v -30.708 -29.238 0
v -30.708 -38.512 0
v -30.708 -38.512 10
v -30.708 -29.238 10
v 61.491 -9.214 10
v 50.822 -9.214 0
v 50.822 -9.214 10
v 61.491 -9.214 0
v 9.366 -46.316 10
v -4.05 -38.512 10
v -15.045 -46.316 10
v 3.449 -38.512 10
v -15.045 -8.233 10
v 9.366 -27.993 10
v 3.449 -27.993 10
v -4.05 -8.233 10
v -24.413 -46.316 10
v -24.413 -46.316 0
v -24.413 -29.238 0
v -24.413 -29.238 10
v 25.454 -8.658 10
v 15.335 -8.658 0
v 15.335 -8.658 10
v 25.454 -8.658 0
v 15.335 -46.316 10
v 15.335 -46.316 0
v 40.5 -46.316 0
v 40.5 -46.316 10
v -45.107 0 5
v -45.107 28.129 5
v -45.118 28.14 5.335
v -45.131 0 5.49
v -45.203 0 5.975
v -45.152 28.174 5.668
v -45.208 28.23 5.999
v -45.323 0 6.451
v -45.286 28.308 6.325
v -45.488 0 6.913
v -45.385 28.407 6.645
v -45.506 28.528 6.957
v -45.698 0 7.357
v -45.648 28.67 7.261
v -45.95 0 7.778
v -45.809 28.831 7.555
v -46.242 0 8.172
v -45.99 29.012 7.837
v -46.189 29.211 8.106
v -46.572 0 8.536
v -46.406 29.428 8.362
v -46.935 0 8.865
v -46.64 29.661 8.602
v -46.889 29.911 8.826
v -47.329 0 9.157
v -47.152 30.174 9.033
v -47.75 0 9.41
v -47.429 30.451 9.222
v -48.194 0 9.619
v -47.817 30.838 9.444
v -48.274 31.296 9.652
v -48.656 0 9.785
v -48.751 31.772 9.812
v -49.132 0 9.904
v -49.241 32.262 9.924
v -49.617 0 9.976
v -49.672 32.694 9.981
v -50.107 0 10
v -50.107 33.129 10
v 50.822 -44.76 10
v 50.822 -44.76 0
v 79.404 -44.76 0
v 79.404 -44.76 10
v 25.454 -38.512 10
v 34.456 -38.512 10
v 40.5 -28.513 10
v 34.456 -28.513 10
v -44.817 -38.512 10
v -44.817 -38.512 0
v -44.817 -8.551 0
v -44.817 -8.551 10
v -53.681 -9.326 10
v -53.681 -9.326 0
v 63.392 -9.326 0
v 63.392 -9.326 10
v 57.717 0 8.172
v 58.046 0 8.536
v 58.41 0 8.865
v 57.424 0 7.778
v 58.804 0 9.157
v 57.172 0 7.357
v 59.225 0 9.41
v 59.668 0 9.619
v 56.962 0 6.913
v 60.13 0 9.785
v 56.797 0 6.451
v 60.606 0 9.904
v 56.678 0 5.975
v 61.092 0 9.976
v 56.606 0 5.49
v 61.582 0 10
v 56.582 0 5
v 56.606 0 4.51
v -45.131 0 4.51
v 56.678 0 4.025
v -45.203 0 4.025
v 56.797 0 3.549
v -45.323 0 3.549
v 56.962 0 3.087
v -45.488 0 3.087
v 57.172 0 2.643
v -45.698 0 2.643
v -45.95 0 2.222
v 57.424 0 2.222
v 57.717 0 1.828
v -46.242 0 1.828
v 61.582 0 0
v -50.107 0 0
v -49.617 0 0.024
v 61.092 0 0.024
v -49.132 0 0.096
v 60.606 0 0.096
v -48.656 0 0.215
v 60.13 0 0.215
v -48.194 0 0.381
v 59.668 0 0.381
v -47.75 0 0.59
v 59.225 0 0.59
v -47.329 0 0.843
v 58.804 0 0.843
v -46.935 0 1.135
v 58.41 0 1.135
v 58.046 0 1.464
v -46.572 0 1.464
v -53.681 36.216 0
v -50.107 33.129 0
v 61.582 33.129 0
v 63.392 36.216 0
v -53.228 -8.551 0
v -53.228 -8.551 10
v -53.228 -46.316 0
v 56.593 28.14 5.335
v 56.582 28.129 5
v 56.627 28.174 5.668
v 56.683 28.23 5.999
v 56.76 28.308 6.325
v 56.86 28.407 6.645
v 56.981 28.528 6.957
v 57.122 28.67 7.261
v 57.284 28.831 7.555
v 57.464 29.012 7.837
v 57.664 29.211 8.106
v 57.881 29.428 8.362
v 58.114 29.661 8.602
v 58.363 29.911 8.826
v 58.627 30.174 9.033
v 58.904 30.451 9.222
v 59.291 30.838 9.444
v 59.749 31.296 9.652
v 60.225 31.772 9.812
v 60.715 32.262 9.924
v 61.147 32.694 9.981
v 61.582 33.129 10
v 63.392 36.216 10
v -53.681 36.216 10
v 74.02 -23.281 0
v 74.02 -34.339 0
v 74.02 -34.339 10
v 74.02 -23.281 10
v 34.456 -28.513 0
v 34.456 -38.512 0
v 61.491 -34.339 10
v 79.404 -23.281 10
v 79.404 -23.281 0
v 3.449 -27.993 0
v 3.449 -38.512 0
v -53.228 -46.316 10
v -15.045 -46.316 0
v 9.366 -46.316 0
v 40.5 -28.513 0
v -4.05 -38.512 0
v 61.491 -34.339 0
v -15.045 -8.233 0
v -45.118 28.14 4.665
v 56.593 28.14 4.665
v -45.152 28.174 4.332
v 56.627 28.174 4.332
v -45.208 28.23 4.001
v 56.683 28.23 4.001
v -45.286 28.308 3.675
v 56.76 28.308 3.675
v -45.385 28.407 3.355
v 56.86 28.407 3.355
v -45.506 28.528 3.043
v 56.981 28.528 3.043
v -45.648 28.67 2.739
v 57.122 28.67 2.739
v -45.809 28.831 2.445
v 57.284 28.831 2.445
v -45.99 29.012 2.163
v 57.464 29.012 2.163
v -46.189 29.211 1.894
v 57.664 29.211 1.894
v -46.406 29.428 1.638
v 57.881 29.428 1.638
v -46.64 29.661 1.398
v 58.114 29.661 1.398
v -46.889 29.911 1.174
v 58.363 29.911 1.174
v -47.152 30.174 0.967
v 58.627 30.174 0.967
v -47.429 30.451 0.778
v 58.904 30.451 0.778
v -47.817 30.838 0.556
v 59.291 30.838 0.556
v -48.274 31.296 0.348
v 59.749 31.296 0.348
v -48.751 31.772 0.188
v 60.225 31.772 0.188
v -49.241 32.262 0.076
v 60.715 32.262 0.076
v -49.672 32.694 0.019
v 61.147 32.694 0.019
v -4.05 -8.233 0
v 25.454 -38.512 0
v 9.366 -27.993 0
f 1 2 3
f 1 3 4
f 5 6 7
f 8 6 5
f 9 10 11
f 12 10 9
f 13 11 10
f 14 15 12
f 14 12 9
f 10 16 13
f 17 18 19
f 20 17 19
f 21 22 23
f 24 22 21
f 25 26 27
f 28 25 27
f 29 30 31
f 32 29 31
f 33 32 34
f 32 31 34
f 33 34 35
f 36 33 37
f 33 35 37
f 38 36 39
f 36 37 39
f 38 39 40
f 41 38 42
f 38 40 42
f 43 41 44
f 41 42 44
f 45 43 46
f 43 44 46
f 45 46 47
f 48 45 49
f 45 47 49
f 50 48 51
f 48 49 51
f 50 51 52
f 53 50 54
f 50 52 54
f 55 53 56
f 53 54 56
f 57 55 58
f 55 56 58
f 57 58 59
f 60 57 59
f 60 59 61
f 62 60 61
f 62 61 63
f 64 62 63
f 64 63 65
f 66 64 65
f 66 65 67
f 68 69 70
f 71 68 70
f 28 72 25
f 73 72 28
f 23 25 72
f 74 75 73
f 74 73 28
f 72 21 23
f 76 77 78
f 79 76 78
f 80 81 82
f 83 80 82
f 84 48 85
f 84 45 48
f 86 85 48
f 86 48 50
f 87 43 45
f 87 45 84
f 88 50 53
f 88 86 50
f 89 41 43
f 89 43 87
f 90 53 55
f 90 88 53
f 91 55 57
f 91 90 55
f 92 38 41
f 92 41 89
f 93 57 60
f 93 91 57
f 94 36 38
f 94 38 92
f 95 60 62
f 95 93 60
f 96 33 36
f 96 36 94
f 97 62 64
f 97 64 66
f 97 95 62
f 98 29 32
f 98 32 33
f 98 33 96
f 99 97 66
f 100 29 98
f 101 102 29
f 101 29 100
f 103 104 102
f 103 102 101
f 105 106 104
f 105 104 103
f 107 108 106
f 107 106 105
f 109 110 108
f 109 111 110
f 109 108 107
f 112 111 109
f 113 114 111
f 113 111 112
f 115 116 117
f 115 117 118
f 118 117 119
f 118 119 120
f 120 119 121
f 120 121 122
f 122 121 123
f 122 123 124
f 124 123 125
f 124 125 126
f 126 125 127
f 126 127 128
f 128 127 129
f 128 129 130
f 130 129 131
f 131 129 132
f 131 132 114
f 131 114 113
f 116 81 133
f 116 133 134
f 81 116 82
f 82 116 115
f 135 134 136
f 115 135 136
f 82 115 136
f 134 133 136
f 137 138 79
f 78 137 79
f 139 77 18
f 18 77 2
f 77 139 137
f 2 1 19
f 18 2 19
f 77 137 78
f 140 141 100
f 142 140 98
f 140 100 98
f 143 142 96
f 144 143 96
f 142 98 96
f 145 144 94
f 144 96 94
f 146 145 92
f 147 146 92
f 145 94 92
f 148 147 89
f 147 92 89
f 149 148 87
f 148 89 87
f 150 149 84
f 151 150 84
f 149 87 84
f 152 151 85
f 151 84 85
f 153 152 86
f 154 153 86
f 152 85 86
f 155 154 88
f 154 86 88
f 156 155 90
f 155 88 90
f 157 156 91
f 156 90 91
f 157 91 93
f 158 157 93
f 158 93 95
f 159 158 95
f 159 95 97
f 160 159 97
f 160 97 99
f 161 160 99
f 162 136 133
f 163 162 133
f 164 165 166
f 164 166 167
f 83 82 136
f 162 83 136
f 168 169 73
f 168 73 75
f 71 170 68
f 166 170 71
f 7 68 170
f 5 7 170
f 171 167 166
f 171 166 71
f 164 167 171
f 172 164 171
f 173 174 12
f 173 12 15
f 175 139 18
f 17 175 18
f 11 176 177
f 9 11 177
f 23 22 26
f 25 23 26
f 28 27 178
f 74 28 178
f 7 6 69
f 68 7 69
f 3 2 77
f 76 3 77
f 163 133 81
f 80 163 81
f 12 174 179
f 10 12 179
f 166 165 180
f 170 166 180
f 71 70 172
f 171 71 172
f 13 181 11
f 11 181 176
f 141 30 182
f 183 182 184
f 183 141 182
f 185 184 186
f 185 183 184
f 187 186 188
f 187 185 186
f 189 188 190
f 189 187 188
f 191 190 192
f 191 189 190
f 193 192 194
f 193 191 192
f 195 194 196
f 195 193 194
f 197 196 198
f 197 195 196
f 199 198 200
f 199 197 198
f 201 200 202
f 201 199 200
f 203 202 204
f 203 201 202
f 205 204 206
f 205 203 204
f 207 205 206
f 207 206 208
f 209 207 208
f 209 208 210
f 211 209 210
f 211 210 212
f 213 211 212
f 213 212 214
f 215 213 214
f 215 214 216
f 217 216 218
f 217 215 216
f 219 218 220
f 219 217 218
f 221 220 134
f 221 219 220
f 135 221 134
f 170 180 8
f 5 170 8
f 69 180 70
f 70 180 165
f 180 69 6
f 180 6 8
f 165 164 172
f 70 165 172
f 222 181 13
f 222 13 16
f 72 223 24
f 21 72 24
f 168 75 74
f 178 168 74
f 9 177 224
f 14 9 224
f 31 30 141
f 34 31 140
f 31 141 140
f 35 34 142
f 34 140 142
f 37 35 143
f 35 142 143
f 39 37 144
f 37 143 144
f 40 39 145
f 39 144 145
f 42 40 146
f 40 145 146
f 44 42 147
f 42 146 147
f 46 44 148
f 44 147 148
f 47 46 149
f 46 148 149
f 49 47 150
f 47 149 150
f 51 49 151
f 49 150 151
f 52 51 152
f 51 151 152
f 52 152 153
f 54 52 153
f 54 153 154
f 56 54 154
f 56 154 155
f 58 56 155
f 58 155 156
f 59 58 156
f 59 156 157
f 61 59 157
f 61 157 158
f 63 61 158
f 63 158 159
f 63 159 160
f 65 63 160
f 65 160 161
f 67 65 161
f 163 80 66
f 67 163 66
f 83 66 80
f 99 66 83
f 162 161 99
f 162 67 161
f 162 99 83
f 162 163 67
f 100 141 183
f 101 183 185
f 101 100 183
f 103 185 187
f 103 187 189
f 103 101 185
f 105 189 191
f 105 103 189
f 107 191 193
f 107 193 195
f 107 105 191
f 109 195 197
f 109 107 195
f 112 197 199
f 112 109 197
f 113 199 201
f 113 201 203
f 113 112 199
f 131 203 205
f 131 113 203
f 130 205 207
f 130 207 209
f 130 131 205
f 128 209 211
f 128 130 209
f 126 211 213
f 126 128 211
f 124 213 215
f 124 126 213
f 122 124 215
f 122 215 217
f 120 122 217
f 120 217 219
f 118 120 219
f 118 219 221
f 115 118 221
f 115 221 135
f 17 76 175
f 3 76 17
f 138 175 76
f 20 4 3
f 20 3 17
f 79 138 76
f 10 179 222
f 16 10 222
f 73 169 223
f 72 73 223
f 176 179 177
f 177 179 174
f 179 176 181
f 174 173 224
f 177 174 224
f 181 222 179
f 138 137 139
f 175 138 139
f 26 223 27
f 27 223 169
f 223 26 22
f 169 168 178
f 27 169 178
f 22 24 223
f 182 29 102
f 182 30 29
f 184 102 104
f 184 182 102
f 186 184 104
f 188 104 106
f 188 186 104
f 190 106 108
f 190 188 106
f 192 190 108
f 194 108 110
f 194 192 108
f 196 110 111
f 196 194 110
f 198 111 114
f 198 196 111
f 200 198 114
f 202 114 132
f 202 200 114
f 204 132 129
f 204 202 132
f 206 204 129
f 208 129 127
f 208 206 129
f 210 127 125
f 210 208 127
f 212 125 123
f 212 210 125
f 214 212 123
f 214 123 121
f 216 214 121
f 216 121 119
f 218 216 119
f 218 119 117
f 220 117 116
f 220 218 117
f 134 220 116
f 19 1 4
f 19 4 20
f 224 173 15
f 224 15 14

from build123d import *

# Parameters (mm, degrees)
F0_W     = 7.9836137593
F0_H     = 8.0866143107
F0_W_2   = 101.6889624298
F0_W_3   = 6.8107172847
F0_H_2   = 28.1290598214
F0_H_3   = 9.3261292204
F0_W_4   = 8.5740201175
F2_DEPTH = 10
F1_W     = 8.4114409983
F1_H     = 7.8040771186
F1_H_2   = 29.9616772681
F1_W_2   = 14.1092445701
F1_W_3   = 6.2941126525
F1_H_3   = 9.2739127576
F1_W_4   = 10.995705612
F1_H_4   = 30.2792191505
F1_W_5   = 7.4987595435
F1_W_6   = 5.9168946464
F1_H_5   = 10.5194970965
F1_W_7   = 10.1195769385
F1_H_6   = 29.8540769145
F1_W_8   = 9.0015586466
F1_W_9   = 6.0446597636
F1_H_7   = 9.9997352809
F1_W_10  = 10.6686763465
F1_H_8   = 25.1244679093
F1_H_9   = 10.4209892452
F1_W_11  = 12.5288702548
F1_W_12  = 5.3845271468
F1_H_10  = 11.0574066639
F3_R     = 4.99999


# Not quite as in the source:
# - a fillet or chamfer is up to 0.001 mm smaller than in the source, because OpenCascade refuses the exact size


with BuildPart() as f2:
    # F0 (on Top) → F2 (new body)
    with BuildSketch(Plane.XY):
        Polygon((-53.0908405781, 28.1290598214), (-53.0908405781, 36.2156741321), (-53.6812469363, 36.2156741321), (-53.6812469363, 0), (-45.1072268188, 0), (-45.1072268188, 28.1290598214), align=None)
        with Locations((-49.0990336984, 32.1723669767)):
            Rectangle(F0_W, F0_H)
        with Locations((5.7372543961, 32.1723669767)):
            Rectangle(F0_W_2, F0_H)
        with Locations((59.9870942533, 32.1723669767)):
            Rectangle(F0_W_3, F0_H)
        with Locations((59.9870942533, 14.0645299107)):
            Rectangle(F0_W_3, F0_H_2)
        with Locations((59.9870942533, -4.6630646102)):
            Rectangle(F0_W_3, F0_H_3)
        with Locations((-49.3942368776, -4.6630646102)):
            Rectangle(F0_W_4, F0_H_3)
        with Locations((5.7372543961, -4.6630646102)):
            Rectangle(F0_W_2, F0_H_3)
    extrude(amount=F2_DEPTH)

    # F3 (radius 5 in the source; OpenCascade refuses exactly that, so slightly less here)
    f3_edges = [f2.edges().sort_by_distance(p)[0] for p in [
        (-45.107227, 14.06453, 0),
        (5.737254, 28.12906, 0),
        (56.581736, 14.06453, 10),
        (5.737254, 28.12906, 10),
        (-45.107227, 14.06453, 10),
        (56.581736, 14.06453, 0),
    ]]
    fillet(f3_edges, radius=F3_R)


with BuildPart() as f2b:
    # F1 (on Top) → F2, piece 2 (new body)
    with BuildSketch(Plane.XY):
        with Locations((-49.022493884, -42.4144025892)):
            Rectangle(F1_W, F1_H)
        with Locations((-49.022493884, -23.5315253958)):
            Rectangle(F1_W, F1_H_2)
        with Locations((-37.7621510997, -42.4144025892)):
            Rectangle(F1_W_2, F1_H)
        with Locations((-27.5604724884, -42.4144025892)):
            Rectangle(F1_W_3, F1_H)
        with Locations((-27.5604724884, -33.8754076511)):
            Rectangle(F1_W_3, F1_H_3)
    extrude(amount=F2_DEPTH)


with BuildPart() as f2c:
    # F1 (on Top) → F2, piece 3 (new body)
    with BuildSketch(Plane.XY):
        with Locations((-9.5474417321, -42.4144025892)):
            Rectangle(F1_W_4, F1_H)
        with Locations((-9.5474417321, -23.3727544546)):
            Rectangle(F1_W_4, F1_H_4)
        with Locations((-0.3002091544, -42.4144025892)):
            Rectangle(F1_W_5, F1_H)
        with Locations((6.4076179406, -42.4144025892)):
            Rectangle(F1_W_6, F1_H)
        with Locations((6.4076179406, -33.2526154816)):
            Rectangle(F1_W_6, F1_H_5)
    extrude(amount=F2_DEPTH)


with BuildPart() as f2d:
    # F1 (on Top) → F2, piece 4 (new body)
    with BuildSketch(Plane.XY):
        with Locations((20.3944290988, -42.4144025892)):
            Rectangle(F1_W_7, F1_H)
        with Locations((20.3944290988, -23.5853255726)):
            Rectangle(F1_W_7, F1_H_6)
        with Locations((29.9549968913, -42.4144025892)):
            Rectangle(F1_W_8, F1_H)
        with Locations((37.4781060964, -42.4144025892)):
            Rectangle(F1_W_9, F1_H)
        with Locations((37.4781060964, -33.5124963894)):
            Rectangle(F1_W_9, F1_H_7)
    extrude(amount=F2_DEPTH)


with BuildPart() as f2e:
    # F1 (on Top) → F2, piece 5 (new body)
    with BuildSketch(Plane.XY):
        with Locations((56.1565961689, -21.7765793204)):
            Rectangle(F1_W_10, F1_H_8)
        with Locations((56.1565961689, -39.5493078977)):
            Rectangle(F1_W_10, F1_H_9)
        with Locations((67.7553694695, -39.5493078977)):
            Rectangle(F1_W_11, F1_H_9)
        with Locations((76.7120681703, -39.5493078977)):
            Rectangle(F1_W_12, F1_H_9)
        with Locations((76.7120681703, -28.8101099432)):
            Rectangle(F1_W_12, F1_H_10)
    extrude(amount=F2_DEPTH)


solid = Compound([f2.part, f2b.part, f2c.part, f2d.part, f2e.part])
